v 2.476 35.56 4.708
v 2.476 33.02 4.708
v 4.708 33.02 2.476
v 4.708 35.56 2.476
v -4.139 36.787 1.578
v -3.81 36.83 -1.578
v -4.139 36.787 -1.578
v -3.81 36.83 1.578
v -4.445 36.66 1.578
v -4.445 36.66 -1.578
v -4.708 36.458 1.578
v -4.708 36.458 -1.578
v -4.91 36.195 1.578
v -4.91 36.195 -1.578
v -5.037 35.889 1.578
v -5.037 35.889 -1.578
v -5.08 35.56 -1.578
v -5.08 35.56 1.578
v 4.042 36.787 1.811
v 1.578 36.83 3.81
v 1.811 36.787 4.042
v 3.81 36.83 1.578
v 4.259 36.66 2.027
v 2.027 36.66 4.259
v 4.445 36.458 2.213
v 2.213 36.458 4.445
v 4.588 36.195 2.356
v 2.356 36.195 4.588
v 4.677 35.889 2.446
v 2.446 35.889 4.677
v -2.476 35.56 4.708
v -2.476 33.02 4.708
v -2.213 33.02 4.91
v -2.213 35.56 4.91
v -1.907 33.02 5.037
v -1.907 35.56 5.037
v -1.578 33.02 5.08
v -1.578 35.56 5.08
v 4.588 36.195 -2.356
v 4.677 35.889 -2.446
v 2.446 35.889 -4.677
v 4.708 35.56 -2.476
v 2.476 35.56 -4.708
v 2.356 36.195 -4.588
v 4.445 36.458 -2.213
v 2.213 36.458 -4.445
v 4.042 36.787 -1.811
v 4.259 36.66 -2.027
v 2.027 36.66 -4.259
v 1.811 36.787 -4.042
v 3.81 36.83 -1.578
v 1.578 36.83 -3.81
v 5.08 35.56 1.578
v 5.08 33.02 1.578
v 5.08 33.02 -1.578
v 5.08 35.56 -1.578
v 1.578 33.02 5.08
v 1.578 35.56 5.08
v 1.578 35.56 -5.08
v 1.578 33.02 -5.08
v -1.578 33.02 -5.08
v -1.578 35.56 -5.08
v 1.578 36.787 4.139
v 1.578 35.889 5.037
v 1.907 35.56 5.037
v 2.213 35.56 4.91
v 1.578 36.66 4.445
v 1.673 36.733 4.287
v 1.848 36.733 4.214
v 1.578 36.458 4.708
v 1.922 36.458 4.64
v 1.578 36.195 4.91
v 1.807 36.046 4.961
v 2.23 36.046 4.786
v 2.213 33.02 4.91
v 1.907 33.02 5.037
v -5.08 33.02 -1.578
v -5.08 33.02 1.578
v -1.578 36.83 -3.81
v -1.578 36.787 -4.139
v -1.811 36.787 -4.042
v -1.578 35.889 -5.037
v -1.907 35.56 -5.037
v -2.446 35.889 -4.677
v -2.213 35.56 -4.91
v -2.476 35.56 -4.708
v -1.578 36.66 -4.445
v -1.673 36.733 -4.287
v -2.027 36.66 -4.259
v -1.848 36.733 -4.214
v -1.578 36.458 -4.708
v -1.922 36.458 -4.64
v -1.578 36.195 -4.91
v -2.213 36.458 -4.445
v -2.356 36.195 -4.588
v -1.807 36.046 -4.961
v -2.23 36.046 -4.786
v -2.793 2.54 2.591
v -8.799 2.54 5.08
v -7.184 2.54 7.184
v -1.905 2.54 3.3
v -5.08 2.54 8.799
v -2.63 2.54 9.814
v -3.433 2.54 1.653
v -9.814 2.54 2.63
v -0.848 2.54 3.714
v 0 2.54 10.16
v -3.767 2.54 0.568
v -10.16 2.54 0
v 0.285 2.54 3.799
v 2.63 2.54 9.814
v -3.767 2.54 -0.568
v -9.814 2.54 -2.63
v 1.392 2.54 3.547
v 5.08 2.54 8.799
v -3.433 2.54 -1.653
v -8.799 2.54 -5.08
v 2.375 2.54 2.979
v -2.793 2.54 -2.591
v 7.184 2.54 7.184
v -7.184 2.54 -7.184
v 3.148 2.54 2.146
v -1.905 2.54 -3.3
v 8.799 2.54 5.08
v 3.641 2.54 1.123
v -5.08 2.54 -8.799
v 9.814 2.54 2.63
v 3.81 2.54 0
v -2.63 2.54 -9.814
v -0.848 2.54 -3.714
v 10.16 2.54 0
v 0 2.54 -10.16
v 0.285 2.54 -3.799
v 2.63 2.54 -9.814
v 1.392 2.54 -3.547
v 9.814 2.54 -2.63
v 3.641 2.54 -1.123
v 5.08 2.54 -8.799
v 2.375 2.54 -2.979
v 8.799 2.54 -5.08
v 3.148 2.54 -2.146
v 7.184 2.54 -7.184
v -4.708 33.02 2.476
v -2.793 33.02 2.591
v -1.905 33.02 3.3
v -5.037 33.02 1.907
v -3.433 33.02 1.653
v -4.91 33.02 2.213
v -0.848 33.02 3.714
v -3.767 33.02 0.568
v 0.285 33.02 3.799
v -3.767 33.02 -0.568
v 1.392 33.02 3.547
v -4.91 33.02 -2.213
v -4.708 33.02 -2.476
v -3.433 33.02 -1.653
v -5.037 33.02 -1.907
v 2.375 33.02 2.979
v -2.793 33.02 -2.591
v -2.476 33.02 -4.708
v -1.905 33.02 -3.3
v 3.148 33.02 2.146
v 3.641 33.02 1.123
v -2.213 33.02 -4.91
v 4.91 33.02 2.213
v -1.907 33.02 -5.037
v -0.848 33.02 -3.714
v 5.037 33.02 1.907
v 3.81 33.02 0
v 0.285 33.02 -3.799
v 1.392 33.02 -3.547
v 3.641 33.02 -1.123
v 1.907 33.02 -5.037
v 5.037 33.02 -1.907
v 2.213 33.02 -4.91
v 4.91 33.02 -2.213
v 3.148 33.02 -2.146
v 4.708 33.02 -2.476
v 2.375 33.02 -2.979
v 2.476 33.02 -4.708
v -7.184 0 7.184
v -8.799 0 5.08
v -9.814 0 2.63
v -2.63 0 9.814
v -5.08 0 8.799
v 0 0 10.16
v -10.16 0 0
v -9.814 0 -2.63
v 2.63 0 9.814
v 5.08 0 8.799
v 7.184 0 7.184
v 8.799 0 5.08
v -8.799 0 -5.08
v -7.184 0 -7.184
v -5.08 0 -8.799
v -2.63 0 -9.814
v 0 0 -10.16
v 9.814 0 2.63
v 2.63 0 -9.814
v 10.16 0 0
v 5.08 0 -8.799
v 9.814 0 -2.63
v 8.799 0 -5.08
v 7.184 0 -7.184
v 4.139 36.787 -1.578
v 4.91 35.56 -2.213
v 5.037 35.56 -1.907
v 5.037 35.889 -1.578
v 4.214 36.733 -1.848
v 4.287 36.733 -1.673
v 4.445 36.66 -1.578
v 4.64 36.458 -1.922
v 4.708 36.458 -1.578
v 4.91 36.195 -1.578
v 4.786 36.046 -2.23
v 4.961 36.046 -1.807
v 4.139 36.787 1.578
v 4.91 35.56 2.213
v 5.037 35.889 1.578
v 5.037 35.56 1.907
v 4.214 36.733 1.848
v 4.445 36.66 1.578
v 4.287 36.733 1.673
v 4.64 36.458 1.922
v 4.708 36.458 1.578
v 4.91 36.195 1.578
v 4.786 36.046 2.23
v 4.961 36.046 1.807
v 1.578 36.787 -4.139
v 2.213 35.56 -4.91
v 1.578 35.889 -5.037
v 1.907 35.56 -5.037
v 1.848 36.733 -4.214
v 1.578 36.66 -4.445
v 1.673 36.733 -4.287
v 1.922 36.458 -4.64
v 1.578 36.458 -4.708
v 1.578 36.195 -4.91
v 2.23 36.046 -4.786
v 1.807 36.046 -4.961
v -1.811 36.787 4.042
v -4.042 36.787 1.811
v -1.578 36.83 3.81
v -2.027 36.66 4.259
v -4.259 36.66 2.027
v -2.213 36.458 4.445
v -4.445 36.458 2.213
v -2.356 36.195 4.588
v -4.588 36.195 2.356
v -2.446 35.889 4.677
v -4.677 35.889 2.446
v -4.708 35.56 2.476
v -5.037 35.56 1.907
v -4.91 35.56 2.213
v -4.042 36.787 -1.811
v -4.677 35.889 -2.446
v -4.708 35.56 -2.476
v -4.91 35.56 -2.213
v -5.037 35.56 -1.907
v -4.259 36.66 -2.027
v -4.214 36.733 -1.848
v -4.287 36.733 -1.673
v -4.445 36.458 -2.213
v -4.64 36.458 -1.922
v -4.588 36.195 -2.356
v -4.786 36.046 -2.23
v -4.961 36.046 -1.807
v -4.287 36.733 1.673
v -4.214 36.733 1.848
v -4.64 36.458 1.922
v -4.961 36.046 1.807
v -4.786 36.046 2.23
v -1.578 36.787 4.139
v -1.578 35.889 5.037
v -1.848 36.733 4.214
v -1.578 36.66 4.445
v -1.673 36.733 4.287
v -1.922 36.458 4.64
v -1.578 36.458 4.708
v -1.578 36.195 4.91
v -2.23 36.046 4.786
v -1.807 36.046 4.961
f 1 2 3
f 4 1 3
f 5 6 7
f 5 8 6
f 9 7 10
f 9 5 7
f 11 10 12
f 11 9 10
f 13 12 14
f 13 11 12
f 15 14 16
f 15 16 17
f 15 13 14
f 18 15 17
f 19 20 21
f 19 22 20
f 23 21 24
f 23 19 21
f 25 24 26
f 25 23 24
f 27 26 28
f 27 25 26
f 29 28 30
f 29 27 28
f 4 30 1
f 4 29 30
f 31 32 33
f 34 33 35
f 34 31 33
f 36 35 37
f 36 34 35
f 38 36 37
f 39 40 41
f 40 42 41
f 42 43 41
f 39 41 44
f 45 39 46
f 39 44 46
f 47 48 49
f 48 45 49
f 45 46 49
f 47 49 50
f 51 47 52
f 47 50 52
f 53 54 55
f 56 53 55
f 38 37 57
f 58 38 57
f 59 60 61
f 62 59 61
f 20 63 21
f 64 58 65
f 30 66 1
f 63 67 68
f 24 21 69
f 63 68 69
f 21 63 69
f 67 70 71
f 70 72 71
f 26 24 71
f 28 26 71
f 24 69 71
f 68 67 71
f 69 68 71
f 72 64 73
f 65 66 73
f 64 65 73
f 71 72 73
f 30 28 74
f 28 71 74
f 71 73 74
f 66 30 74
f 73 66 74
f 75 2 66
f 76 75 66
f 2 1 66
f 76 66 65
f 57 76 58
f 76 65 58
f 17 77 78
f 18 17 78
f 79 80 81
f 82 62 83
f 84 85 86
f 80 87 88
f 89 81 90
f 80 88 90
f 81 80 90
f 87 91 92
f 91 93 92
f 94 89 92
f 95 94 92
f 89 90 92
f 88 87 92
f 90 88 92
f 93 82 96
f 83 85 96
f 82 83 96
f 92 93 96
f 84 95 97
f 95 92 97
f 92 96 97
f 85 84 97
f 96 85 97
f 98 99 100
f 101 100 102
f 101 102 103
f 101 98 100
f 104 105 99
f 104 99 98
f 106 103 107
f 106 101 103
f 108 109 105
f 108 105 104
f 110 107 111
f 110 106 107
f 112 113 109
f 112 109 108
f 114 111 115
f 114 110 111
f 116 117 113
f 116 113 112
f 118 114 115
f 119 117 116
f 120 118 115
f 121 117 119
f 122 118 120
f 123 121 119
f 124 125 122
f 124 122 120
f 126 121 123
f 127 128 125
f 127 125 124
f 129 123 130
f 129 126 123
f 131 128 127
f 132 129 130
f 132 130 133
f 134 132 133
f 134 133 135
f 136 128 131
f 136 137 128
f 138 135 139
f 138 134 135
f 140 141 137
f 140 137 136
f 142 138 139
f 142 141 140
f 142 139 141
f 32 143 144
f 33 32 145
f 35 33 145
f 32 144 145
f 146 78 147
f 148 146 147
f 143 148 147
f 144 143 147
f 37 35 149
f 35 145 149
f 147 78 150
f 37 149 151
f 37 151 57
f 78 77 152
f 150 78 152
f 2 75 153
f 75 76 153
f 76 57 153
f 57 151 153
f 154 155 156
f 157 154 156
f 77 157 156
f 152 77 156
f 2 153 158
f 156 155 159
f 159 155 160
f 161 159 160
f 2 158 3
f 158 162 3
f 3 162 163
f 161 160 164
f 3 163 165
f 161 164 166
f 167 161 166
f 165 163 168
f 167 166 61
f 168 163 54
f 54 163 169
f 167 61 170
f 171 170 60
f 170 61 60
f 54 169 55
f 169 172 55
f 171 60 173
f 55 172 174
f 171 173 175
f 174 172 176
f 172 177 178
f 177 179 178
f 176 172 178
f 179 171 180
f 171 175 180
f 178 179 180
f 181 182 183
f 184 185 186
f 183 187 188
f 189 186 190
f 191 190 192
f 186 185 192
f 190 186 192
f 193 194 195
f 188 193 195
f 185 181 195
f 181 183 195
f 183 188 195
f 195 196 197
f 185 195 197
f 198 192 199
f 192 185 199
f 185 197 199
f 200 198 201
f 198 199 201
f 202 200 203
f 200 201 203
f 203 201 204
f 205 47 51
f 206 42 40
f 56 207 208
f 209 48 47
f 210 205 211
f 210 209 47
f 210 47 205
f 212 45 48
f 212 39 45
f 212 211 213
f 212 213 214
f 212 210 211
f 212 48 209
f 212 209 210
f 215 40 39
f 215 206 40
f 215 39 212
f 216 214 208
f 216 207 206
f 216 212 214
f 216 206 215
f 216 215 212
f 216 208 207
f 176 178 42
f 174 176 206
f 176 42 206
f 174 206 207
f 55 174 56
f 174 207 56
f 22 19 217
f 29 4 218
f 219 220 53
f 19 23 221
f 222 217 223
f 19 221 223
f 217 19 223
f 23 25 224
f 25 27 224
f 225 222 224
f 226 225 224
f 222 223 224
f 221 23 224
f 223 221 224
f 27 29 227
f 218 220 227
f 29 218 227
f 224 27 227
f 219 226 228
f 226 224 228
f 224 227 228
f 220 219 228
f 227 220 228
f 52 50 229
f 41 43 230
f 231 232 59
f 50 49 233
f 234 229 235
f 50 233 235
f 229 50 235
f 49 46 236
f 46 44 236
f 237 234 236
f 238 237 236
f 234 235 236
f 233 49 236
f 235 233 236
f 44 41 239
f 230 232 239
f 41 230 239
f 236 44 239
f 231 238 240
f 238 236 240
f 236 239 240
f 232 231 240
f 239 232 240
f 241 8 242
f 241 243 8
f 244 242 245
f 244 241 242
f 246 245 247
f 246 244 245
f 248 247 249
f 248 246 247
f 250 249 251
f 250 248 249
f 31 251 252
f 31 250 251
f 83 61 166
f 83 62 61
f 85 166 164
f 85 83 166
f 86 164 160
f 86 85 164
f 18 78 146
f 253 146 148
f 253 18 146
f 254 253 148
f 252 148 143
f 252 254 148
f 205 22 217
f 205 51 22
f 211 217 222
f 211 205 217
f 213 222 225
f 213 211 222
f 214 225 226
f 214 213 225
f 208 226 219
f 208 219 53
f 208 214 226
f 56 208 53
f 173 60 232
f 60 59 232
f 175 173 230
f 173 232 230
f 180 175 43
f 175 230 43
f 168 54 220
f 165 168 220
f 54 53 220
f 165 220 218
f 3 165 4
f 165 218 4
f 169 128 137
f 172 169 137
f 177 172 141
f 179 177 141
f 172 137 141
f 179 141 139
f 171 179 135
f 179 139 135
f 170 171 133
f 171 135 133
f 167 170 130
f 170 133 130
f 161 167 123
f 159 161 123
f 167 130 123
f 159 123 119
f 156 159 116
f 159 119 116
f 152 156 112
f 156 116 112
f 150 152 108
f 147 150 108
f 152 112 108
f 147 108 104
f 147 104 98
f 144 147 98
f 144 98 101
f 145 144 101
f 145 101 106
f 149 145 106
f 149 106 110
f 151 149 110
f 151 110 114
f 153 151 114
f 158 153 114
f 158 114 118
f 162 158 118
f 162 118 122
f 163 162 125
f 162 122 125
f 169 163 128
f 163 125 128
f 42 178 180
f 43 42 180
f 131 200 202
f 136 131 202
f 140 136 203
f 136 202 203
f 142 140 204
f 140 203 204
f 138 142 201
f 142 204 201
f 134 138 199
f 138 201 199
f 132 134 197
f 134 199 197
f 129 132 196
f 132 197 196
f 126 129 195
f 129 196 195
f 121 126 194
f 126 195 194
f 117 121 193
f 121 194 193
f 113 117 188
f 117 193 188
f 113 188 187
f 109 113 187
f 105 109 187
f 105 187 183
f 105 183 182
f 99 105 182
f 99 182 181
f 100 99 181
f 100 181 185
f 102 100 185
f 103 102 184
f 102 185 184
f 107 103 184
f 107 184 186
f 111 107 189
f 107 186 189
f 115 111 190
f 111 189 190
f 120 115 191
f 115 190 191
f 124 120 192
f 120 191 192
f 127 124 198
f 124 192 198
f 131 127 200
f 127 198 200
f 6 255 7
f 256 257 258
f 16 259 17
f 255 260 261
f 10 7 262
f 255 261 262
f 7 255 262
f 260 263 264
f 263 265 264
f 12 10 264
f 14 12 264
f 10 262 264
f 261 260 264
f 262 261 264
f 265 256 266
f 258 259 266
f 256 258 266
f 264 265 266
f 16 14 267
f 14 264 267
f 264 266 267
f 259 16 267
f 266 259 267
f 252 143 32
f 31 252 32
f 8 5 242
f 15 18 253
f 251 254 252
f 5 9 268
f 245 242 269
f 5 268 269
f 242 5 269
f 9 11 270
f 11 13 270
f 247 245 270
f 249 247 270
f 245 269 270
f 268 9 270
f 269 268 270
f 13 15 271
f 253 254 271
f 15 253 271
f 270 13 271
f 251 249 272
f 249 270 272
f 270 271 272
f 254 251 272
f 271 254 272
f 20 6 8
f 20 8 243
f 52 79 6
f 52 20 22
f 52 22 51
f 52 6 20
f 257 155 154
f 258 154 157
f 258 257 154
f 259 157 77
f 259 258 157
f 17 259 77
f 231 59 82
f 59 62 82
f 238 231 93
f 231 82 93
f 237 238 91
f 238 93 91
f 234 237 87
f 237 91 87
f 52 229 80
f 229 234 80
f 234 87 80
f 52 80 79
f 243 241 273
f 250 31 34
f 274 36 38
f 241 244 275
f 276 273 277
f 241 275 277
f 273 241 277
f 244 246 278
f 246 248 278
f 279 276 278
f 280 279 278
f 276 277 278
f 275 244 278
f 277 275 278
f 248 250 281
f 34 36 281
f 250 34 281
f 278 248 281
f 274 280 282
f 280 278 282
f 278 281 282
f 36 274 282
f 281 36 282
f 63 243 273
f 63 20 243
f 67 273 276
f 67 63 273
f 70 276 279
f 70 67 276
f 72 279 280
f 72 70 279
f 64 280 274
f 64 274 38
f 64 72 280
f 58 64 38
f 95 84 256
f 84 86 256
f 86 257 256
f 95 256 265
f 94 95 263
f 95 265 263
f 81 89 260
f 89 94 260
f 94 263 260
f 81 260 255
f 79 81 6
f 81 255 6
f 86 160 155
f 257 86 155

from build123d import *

# Parameters (mm, degrees)
SKETCH1_R           = 10.16
BOSS_EXTRUDE1_DEPTH = 2.54
SKETCH2_R           = 3.81
BOSS_EXTRUDE2_DEPTH = 30.48
BOSS_EXTRUDE3_DEPTH = 3.81
FILLET1_R           = 1.27


with BuildPart() as part:
    # Sketch1 → Boss-Extrude1 (new body)
    with BuildSketch(Plane(origin=(0, 0, 0), x_dir=(1, 0, 0), z_dir=(0, 1, 0))):
        Circle(SKETCH1_R)
    extrude(amount=BOSS_EXTRUDE1_DEPTH)

    # Sketch2 → Boss-Extrude2 (add)
    with BuildSketch(Plane(origin=(0, 2.54, 0), x_dir=(1, 0, 0), z_dir=(0, 1, 0))):
        Circle(SKETCH2_R)
    extrude(amount=BOSS_EXTRUDE2_DEPTH)

    # Sketch3 → Boss-Extrude3 (add)
    with BuildSketch(Plane(origin=(0, 33.02, 0), x_dir=(1, 0, 0), z_dir=(0, 1, 0))):
        Polygon((2.104204897, 5.08), (-2.104204897, 5.08), (-5.08, 2.104204897), (-5.08, -2.104204897), (-2.104204897, -5.08), (2.104204897, -5.08), (5.08, -2.104204897), (5.08, 2.104204897), align=None)
    extrude(amount=BOSS_EXTRUDE3_DEPTH)

    # Fillet1
    fillet1_edges = [part.edges().sort_by_distance(p)[0] for p in [
        (5.08, 34.925, -2.104204897),
        (2.104204897, 34.925, -5.08),
        (-2.104204897, 34.925, -5.08),
        (-5.08, 34.925, -2.104204897),
        (-5.08, 34.925, 2.104204897),
        (-2.104204897, 34.925, 5.08),
        (2.104204897, 34.925, 5.08),
        (5.08, 34.925, 2.104204897),
        (3.592102448, 36.83, -3.592102448),
        (0, 36.83, -5.08),
        (-3.592102448, 36.83, -3.592102448),
        (-5.08, 36.83, 0),
        (-3.592102448, 36.83, 3.592102448),
        (0, 36.83, 5.08),
        (3.592102448, 36.83, 3.592102448),
        (5.08, 36.83, 0),
    ]]
    fillet(fillet1_edges, radius=FILLET1_R)


solid = part.part
